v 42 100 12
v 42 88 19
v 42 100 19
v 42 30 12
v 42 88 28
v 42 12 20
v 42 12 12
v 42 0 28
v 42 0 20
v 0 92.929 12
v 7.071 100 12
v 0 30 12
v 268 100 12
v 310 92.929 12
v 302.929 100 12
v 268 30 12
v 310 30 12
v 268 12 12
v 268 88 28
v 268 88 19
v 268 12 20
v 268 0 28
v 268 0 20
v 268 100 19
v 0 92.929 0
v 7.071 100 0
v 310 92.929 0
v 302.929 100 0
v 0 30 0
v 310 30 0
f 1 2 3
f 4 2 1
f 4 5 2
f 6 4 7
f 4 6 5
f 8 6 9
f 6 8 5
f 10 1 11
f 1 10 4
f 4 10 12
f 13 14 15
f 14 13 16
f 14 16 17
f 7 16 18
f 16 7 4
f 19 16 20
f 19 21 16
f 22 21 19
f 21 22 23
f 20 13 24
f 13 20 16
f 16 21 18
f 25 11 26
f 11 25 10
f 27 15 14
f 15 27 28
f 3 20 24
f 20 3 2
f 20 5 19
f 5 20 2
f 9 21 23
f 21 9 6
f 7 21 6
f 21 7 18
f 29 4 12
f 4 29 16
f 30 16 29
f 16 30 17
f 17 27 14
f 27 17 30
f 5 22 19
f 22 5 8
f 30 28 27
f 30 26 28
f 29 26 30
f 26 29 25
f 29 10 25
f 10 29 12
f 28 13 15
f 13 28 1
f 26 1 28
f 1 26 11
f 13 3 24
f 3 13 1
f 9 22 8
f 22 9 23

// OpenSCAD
include <../src/wardrobe.scad>;
plank_zx_rear_side();
//github_openscad -o wardrobe_2/plank_zx_rear_side.stl -D wardrobe_n=2 -D cutting_edge=0 -D break_view_length=0 wardrobe_2/plank_zx_rear_side_stl.scad
